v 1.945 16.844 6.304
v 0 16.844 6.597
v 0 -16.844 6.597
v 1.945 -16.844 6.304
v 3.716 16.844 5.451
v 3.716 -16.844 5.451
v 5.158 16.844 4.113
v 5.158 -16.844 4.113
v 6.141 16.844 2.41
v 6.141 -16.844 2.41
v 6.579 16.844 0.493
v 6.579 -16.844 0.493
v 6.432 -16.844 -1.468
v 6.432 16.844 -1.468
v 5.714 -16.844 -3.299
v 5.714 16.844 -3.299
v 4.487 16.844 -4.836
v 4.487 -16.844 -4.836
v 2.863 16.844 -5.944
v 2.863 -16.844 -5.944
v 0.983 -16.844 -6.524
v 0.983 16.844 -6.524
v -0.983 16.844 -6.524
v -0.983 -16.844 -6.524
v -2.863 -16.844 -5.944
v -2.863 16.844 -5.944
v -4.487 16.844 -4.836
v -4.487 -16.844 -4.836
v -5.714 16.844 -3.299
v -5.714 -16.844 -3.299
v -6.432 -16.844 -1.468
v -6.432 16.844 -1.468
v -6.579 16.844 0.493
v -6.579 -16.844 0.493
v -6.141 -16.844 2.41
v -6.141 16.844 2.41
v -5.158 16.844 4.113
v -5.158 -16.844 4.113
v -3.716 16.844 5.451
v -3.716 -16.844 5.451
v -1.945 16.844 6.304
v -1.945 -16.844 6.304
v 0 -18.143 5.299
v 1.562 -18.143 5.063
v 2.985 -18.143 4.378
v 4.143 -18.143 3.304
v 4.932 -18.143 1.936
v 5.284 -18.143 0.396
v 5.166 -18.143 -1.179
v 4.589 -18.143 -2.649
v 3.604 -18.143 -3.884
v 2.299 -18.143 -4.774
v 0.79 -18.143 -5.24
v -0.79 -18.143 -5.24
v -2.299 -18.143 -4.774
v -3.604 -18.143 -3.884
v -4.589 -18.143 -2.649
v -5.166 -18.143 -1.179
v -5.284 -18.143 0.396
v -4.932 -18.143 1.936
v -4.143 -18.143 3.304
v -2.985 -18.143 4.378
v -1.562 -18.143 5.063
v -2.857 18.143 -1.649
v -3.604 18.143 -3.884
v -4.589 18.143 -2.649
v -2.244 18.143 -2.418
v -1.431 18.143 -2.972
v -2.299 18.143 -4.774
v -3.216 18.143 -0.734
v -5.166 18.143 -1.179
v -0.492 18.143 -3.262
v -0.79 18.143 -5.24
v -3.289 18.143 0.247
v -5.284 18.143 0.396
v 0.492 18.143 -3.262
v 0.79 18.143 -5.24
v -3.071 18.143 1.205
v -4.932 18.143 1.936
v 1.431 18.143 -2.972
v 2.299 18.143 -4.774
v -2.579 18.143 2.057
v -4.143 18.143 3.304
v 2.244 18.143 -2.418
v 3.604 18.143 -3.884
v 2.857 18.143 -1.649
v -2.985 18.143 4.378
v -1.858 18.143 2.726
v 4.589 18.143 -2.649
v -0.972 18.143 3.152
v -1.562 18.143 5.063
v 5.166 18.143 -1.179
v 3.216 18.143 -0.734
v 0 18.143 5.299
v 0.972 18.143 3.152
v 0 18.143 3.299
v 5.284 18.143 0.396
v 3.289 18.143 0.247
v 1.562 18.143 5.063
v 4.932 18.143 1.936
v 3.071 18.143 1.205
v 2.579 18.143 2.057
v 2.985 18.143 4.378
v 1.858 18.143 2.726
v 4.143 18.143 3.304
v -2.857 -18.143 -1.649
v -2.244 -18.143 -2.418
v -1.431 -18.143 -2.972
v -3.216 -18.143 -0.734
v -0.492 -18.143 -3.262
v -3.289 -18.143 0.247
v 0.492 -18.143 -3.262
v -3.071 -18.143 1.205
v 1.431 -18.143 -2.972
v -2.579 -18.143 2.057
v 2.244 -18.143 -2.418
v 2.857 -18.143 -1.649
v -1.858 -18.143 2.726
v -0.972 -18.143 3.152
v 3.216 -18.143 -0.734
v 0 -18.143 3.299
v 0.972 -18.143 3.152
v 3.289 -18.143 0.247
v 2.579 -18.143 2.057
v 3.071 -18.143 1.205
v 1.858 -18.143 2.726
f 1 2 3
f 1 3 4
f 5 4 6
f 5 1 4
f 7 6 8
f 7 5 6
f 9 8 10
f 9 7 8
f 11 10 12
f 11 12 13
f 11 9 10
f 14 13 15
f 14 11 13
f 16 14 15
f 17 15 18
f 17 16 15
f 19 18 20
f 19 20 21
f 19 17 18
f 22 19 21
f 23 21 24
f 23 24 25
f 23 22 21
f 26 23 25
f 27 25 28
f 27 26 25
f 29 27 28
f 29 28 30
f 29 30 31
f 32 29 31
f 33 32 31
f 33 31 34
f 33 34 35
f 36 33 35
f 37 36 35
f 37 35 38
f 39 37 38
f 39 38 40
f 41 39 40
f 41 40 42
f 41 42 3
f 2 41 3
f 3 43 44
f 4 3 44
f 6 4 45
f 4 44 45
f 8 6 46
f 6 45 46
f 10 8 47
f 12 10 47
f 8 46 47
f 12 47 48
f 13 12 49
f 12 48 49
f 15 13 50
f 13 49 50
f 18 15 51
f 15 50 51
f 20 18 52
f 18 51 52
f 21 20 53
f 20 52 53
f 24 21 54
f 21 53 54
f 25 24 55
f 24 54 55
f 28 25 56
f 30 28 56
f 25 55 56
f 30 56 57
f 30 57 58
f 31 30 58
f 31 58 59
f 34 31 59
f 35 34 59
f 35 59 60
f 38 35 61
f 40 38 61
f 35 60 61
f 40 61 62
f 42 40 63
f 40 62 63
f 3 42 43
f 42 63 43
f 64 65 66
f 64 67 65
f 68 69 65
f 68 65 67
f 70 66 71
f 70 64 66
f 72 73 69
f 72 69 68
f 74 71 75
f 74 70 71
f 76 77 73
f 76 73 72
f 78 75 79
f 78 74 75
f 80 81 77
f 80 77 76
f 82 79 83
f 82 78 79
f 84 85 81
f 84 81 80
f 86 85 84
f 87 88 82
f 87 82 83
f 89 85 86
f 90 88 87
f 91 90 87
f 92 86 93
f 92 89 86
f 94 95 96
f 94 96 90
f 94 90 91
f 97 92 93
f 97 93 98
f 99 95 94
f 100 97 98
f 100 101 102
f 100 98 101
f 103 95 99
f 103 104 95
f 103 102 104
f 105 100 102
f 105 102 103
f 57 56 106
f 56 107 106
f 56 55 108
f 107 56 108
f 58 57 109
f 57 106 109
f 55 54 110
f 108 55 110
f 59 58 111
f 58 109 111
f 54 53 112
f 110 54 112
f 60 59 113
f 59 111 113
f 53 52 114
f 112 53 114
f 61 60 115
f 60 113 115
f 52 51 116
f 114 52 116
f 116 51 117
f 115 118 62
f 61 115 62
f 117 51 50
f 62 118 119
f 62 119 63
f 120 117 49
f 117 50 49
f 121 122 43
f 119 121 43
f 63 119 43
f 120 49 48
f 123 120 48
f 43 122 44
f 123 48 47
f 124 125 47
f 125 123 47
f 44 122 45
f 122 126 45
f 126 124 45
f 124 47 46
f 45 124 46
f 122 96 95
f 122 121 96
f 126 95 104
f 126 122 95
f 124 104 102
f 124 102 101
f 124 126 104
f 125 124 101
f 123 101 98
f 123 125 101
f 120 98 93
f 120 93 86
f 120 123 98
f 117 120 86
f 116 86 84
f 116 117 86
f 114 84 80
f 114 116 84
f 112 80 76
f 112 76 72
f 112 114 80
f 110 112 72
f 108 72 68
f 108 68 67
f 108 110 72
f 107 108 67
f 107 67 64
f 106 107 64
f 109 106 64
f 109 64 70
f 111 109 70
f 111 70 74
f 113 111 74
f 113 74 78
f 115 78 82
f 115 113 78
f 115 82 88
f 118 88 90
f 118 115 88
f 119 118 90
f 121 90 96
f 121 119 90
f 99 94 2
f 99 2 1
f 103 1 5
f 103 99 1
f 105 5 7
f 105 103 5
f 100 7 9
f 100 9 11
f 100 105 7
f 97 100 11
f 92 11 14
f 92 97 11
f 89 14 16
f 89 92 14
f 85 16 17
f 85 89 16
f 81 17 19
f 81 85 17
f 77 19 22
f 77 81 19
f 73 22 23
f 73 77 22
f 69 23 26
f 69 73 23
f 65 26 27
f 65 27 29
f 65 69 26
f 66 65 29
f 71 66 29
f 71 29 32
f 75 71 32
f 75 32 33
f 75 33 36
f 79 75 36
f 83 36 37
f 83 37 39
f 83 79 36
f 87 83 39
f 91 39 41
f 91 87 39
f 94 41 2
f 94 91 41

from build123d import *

# Parameters (mm, degrees)
SKETCH1_R           = 12.7
SKETCH1_R_2         = 6.35
BOSS_EXTRUDE1_DEPTH = 34.925
CHAMFER1_SIZE       = 2.5
SCALE1_SCALE        = 0.51948


with BuildPart() as part:
    # Sketch1 → Boss-Extrude1 (new, symmetric)
    with BuildSketch(Plane(origin=(0, 0, 0), x_dir=(1, 0, 0), z_dir=(0, 1, 0))):
        with Locations(Location((0, 0, 0), (0, 0, 270))):
            Circle(SKETCH1_R)
        with Locations(Location((0, 0, 0), (0, 0, 270))):
            Circle(SKETCH1_R_2, mode=Mode.SUBTRACT)
    extrude(amount=BOSS_EXTRUDE1_DEPTH, both=True)

    # Chamfer1
    chamfer1_edges = [part.edges().sort_by_distance(p)[0] for p in [
        (0, -34.925, -12.7),
        (0, 34.925, -12.7),
    ]]
    chamfer(chamfer1_edges, length=CHAMFER1_SIZE)


with BuildPart() as part_1:
    # Scale1: scaled about (0, 0, 0)
    add(part.part.scale(SCALE1_SCALE))


solid = part_1.part
